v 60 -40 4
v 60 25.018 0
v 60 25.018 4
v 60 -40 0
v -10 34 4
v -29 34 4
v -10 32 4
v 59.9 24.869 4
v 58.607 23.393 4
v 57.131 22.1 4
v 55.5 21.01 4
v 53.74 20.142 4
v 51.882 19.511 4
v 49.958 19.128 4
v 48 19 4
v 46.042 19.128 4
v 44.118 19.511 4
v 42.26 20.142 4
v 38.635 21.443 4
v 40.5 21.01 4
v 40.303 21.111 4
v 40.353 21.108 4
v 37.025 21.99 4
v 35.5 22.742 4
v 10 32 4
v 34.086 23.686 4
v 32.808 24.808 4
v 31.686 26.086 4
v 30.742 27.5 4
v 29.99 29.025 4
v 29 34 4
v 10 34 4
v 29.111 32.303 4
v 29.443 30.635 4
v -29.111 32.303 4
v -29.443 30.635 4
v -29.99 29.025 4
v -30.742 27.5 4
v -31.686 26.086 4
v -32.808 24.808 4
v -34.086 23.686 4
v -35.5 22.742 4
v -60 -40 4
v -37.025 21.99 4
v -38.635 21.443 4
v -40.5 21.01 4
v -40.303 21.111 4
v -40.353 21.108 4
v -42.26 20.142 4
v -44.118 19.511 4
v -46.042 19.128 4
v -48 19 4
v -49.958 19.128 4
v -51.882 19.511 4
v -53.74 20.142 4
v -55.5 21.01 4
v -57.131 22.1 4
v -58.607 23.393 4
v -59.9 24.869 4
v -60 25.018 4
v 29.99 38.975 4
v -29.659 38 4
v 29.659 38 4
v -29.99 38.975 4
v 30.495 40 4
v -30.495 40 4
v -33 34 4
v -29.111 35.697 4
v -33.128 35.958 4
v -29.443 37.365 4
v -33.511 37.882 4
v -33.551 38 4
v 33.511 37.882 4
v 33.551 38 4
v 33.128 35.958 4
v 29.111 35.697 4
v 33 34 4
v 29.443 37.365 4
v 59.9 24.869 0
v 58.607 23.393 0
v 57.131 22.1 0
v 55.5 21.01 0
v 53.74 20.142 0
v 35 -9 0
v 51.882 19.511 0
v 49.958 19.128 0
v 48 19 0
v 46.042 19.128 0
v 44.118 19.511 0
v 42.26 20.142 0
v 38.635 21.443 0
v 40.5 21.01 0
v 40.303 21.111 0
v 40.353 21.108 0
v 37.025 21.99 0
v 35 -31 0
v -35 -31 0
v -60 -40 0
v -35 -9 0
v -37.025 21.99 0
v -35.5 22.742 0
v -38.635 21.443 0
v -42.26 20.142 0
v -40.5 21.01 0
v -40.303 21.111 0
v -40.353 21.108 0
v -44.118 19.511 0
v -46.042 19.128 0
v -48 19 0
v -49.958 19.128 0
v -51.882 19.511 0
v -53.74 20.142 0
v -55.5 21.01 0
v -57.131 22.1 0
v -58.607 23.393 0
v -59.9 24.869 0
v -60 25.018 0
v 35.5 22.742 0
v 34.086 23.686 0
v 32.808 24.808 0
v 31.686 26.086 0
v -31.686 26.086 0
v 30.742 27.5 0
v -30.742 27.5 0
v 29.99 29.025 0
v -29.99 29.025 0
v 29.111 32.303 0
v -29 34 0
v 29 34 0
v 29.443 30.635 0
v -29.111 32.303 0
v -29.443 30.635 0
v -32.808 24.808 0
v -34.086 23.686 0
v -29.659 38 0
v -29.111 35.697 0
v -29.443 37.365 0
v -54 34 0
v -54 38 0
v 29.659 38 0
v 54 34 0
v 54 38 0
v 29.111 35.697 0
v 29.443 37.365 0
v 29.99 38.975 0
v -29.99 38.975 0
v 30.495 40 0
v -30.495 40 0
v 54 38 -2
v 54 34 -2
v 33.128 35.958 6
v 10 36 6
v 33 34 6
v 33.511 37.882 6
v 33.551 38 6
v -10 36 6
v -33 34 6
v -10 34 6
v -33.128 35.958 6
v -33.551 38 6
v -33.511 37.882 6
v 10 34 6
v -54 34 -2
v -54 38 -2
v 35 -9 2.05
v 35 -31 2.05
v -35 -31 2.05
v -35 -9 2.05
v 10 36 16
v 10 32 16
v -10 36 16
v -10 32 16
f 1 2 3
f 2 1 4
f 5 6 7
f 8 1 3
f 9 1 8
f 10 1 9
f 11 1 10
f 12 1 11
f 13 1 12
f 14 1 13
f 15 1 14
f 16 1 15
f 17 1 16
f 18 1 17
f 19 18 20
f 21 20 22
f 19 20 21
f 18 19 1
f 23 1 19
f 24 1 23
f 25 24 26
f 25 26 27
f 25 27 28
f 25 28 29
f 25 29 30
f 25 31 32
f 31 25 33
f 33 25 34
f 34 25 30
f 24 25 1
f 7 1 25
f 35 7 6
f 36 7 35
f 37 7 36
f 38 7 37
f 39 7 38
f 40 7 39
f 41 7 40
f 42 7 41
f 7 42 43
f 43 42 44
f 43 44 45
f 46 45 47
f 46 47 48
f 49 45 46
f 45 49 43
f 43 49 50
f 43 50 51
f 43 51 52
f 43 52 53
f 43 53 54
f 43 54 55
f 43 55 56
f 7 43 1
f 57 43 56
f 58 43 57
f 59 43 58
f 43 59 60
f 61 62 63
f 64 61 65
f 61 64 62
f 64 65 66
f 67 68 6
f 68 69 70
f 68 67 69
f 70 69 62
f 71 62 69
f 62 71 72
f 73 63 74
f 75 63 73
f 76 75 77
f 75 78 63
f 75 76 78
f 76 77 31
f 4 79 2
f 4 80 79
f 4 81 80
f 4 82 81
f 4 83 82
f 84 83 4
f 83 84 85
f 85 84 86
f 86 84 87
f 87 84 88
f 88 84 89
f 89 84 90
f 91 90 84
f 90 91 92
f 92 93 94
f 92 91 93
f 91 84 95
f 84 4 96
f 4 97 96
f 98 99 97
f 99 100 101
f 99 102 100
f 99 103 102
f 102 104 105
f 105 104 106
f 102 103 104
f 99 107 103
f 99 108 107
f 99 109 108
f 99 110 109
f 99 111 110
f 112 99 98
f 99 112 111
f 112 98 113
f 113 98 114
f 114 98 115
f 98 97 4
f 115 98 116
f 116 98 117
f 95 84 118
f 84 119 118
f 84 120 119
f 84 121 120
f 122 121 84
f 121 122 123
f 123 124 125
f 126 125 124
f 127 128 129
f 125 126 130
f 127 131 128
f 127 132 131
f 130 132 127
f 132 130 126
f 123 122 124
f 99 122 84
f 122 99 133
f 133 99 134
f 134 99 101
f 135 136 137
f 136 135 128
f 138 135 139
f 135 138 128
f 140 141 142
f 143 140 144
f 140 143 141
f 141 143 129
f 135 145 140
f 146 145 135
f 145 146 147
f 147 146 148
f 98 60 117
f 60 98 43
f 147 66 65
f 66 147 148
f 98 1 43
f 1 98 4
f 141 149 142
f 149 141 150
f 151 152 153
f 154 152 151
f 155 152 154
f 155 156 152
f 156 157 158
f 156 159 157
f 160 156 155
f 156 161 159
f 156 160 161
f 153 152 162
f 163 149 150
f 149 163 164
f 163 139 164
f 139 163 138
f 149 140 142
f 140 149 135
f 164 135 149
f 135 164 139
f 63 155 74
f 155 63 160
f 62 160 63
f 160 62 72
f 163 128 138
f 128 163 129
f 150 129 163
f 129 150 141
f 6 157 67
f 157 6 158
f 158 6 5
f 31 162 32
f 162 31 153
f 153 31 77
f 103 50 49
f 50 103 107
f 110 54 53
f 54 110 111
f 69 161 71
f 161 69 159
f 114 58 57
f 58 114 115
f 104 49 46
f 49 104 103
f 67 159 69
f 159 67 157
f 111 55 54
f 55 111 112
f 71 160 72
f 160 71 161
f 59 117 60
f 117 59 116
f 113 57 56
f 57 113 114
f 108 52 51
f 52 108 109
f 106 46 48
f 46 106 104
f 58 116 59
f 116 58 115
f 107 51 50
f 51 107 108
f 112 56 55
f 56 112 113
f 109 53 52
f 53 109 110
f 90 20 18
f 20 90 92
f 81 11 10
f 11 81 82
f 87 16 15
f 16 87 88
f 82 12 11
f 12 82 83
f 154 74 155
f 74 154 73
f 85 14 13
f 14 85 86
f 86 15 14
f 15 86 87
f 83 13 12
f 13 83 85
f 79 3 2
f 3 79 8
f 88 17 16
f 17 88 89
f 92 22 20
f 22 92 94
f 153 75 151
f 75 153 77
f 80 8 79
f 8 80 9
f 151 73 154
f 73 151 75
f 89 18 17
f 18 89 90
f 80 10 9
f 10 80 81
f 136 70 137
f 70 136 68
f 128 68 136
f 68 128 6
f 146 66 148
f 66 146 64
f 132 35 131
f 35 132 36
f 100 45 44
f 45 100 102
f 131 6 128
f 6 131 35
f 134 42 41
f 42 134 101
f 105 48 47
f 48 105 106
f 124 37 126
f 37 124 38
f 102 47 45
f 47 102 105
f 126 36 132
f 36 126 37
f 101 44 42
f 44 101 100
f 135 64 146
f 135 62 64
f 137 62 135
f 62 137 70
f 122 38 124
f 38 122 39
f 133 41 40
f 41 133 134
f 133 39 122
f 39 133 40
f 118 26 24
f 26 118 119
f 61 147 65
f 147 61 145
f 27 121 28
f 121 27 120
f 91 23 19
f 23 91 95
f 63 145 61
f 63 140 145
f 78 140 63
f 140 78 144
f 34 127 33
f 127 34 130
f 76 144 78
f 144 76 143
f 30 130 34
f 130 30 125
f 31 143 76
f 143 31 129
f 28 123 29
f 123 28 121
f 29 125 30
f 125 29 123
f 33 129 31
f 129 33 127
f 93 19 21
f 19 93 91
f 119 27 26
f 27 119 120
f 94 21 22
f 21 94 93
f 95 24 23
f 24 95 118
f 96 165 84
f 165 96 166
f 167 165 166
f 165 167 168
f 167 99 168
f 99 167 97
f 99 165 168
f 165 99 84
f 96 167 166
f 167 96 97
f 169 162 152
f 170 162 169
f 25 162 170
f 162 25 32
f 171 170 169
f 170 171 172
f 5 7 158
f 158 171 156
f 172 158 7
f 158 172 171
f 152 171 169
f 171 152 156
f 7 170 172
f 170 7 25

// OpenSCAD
// frame.scad — parametric modular chassis frame for the MyZubster DIY kit (issue #75).
// Render to STL with:
//   openscad -o frame.stl frame.scad
// Keep this source in the kit so the maintainer / community can iterate on
// sensor brackets, motor mounts, and wheel cutouts without re-modeling from scratch.

// --- Parameters (mm) ---
frame_length = 120;      // X axis — chassis length
frame_width = 80;        // Y axis — chassis width
frame_thickness = 4;     // Z axis — chassis plate thickness

motor_well_diameter = 26; // cutout for a TT motor + wheel housing
esp_mount_post_d = 5;    // ESP32 DevKit V1 mount post diameter (M3 screw)
esp_mount_dx = 24;        // ESP32 mount posts spacing along X
esp_mount_dy = 51;        // ESP32 mount posts spacing along Y

battery_slot_w = 22;      // 18650 cell diameter incl. filament tolerance
battery_slot_l = 70;      // 18650 cell length incl. terminals
battery_slot_d = 4;       // depth of battery cradle recess

wheel_clear_d = 30;       // wheel clearance cutout so wheels do not rub chassis
wheel_clear_offset = 12;  // how far the wheel is inset from chassis edge

$fn = 48;

module base_plate() {
    translate([-frame_length/2, -frame_width/2, 0])
        cube([frame_length, frame_width, frame_thickness]);
}

module motor_well_pair() {
    // Two wells, one per drive wheel, mounted at the front edge so wheels can
    // turn freely under the chassis. Spacer blocks fix the TT motor to the plate.
    for (sx = [-1, 1]) {
        translate([sx * (frame_length/2 - wheel_clear_offset),
                   frame_width/2 - 6, frame_thickness])
            cylinder(d = wheel_clear_d, h = frame_thickness * 2, center = true);
    }
    for (sx = [-1, 1]) {
        translate([sx * (frame_length/2 - wheel_clear_offset - 6),
                   frame_width/2 - 6, frame_thickness/2])
            cylinder(d = motor_well_diameter, h = frame_thickness, center = true);
    }
}

module esp_mount_posts() {
    // Four posts around the ESP32 footprint for non-permanent standoff mounting.
    for (sx = [-1, 1], sy = [-1, 1]) {
        translate([sx * esp_mount_dx, sy * esp_mount_dy, 0])
            cylinder(d = esp_mount_post_d, h = frame_thickness + 2);
    }
}

module battery_cradle() {
    // Recessed cradle for a single 18650 cell + TP4056 breakout.
    translate([0, -frame_width/4, frame_thickness - battery_slot_d])
        cube([battery_slot_l, battery_slot_w, battery_slot_d + 0.1], center = true);
}

module chassis_frame() {
    difference() {
        union() {
            base_plate();
            // small front lip to give the chassis some rigidity without
            // over-printing material
            translate([0, frame_width/2 - 2 - frame_thickness/2, frame_thickness/2])
                cube([frame_length - 12, frame_thickness, frame_thickness + 4], center = true);
        }
        motor_well_pair();
        battery_cradle();
        // Tap the ESP32 mount posts for M3 screws (small through-hole).
        for (sx = [-1, 1], sy = [-1, 1]) {
            translate([sx * esp_mount_dx, sy * esp_mount_dy, -1])
                cylinder(d = 1.6, h = frame_thickness + 4);
        }
    }
    // Re-mount sensor brackets: an HC-SR04 holder at the front edge.
    translate([0, frame_width/2 - 6, frame_thickness]) {
        translate([0, 0, 6]) cube([20, 4, 12], center = true);
    }
}

chassis_frame();

// Hint: tolerate version drift — for a different wheel size or a 4-pack motor
// kit (`Mecanum`, `Omni`), edit `wheel_clear_d` and `motor_well_diameter`.
// For an ESP32-S3, edit `esp_mount_dy` (dev kit width differs).
